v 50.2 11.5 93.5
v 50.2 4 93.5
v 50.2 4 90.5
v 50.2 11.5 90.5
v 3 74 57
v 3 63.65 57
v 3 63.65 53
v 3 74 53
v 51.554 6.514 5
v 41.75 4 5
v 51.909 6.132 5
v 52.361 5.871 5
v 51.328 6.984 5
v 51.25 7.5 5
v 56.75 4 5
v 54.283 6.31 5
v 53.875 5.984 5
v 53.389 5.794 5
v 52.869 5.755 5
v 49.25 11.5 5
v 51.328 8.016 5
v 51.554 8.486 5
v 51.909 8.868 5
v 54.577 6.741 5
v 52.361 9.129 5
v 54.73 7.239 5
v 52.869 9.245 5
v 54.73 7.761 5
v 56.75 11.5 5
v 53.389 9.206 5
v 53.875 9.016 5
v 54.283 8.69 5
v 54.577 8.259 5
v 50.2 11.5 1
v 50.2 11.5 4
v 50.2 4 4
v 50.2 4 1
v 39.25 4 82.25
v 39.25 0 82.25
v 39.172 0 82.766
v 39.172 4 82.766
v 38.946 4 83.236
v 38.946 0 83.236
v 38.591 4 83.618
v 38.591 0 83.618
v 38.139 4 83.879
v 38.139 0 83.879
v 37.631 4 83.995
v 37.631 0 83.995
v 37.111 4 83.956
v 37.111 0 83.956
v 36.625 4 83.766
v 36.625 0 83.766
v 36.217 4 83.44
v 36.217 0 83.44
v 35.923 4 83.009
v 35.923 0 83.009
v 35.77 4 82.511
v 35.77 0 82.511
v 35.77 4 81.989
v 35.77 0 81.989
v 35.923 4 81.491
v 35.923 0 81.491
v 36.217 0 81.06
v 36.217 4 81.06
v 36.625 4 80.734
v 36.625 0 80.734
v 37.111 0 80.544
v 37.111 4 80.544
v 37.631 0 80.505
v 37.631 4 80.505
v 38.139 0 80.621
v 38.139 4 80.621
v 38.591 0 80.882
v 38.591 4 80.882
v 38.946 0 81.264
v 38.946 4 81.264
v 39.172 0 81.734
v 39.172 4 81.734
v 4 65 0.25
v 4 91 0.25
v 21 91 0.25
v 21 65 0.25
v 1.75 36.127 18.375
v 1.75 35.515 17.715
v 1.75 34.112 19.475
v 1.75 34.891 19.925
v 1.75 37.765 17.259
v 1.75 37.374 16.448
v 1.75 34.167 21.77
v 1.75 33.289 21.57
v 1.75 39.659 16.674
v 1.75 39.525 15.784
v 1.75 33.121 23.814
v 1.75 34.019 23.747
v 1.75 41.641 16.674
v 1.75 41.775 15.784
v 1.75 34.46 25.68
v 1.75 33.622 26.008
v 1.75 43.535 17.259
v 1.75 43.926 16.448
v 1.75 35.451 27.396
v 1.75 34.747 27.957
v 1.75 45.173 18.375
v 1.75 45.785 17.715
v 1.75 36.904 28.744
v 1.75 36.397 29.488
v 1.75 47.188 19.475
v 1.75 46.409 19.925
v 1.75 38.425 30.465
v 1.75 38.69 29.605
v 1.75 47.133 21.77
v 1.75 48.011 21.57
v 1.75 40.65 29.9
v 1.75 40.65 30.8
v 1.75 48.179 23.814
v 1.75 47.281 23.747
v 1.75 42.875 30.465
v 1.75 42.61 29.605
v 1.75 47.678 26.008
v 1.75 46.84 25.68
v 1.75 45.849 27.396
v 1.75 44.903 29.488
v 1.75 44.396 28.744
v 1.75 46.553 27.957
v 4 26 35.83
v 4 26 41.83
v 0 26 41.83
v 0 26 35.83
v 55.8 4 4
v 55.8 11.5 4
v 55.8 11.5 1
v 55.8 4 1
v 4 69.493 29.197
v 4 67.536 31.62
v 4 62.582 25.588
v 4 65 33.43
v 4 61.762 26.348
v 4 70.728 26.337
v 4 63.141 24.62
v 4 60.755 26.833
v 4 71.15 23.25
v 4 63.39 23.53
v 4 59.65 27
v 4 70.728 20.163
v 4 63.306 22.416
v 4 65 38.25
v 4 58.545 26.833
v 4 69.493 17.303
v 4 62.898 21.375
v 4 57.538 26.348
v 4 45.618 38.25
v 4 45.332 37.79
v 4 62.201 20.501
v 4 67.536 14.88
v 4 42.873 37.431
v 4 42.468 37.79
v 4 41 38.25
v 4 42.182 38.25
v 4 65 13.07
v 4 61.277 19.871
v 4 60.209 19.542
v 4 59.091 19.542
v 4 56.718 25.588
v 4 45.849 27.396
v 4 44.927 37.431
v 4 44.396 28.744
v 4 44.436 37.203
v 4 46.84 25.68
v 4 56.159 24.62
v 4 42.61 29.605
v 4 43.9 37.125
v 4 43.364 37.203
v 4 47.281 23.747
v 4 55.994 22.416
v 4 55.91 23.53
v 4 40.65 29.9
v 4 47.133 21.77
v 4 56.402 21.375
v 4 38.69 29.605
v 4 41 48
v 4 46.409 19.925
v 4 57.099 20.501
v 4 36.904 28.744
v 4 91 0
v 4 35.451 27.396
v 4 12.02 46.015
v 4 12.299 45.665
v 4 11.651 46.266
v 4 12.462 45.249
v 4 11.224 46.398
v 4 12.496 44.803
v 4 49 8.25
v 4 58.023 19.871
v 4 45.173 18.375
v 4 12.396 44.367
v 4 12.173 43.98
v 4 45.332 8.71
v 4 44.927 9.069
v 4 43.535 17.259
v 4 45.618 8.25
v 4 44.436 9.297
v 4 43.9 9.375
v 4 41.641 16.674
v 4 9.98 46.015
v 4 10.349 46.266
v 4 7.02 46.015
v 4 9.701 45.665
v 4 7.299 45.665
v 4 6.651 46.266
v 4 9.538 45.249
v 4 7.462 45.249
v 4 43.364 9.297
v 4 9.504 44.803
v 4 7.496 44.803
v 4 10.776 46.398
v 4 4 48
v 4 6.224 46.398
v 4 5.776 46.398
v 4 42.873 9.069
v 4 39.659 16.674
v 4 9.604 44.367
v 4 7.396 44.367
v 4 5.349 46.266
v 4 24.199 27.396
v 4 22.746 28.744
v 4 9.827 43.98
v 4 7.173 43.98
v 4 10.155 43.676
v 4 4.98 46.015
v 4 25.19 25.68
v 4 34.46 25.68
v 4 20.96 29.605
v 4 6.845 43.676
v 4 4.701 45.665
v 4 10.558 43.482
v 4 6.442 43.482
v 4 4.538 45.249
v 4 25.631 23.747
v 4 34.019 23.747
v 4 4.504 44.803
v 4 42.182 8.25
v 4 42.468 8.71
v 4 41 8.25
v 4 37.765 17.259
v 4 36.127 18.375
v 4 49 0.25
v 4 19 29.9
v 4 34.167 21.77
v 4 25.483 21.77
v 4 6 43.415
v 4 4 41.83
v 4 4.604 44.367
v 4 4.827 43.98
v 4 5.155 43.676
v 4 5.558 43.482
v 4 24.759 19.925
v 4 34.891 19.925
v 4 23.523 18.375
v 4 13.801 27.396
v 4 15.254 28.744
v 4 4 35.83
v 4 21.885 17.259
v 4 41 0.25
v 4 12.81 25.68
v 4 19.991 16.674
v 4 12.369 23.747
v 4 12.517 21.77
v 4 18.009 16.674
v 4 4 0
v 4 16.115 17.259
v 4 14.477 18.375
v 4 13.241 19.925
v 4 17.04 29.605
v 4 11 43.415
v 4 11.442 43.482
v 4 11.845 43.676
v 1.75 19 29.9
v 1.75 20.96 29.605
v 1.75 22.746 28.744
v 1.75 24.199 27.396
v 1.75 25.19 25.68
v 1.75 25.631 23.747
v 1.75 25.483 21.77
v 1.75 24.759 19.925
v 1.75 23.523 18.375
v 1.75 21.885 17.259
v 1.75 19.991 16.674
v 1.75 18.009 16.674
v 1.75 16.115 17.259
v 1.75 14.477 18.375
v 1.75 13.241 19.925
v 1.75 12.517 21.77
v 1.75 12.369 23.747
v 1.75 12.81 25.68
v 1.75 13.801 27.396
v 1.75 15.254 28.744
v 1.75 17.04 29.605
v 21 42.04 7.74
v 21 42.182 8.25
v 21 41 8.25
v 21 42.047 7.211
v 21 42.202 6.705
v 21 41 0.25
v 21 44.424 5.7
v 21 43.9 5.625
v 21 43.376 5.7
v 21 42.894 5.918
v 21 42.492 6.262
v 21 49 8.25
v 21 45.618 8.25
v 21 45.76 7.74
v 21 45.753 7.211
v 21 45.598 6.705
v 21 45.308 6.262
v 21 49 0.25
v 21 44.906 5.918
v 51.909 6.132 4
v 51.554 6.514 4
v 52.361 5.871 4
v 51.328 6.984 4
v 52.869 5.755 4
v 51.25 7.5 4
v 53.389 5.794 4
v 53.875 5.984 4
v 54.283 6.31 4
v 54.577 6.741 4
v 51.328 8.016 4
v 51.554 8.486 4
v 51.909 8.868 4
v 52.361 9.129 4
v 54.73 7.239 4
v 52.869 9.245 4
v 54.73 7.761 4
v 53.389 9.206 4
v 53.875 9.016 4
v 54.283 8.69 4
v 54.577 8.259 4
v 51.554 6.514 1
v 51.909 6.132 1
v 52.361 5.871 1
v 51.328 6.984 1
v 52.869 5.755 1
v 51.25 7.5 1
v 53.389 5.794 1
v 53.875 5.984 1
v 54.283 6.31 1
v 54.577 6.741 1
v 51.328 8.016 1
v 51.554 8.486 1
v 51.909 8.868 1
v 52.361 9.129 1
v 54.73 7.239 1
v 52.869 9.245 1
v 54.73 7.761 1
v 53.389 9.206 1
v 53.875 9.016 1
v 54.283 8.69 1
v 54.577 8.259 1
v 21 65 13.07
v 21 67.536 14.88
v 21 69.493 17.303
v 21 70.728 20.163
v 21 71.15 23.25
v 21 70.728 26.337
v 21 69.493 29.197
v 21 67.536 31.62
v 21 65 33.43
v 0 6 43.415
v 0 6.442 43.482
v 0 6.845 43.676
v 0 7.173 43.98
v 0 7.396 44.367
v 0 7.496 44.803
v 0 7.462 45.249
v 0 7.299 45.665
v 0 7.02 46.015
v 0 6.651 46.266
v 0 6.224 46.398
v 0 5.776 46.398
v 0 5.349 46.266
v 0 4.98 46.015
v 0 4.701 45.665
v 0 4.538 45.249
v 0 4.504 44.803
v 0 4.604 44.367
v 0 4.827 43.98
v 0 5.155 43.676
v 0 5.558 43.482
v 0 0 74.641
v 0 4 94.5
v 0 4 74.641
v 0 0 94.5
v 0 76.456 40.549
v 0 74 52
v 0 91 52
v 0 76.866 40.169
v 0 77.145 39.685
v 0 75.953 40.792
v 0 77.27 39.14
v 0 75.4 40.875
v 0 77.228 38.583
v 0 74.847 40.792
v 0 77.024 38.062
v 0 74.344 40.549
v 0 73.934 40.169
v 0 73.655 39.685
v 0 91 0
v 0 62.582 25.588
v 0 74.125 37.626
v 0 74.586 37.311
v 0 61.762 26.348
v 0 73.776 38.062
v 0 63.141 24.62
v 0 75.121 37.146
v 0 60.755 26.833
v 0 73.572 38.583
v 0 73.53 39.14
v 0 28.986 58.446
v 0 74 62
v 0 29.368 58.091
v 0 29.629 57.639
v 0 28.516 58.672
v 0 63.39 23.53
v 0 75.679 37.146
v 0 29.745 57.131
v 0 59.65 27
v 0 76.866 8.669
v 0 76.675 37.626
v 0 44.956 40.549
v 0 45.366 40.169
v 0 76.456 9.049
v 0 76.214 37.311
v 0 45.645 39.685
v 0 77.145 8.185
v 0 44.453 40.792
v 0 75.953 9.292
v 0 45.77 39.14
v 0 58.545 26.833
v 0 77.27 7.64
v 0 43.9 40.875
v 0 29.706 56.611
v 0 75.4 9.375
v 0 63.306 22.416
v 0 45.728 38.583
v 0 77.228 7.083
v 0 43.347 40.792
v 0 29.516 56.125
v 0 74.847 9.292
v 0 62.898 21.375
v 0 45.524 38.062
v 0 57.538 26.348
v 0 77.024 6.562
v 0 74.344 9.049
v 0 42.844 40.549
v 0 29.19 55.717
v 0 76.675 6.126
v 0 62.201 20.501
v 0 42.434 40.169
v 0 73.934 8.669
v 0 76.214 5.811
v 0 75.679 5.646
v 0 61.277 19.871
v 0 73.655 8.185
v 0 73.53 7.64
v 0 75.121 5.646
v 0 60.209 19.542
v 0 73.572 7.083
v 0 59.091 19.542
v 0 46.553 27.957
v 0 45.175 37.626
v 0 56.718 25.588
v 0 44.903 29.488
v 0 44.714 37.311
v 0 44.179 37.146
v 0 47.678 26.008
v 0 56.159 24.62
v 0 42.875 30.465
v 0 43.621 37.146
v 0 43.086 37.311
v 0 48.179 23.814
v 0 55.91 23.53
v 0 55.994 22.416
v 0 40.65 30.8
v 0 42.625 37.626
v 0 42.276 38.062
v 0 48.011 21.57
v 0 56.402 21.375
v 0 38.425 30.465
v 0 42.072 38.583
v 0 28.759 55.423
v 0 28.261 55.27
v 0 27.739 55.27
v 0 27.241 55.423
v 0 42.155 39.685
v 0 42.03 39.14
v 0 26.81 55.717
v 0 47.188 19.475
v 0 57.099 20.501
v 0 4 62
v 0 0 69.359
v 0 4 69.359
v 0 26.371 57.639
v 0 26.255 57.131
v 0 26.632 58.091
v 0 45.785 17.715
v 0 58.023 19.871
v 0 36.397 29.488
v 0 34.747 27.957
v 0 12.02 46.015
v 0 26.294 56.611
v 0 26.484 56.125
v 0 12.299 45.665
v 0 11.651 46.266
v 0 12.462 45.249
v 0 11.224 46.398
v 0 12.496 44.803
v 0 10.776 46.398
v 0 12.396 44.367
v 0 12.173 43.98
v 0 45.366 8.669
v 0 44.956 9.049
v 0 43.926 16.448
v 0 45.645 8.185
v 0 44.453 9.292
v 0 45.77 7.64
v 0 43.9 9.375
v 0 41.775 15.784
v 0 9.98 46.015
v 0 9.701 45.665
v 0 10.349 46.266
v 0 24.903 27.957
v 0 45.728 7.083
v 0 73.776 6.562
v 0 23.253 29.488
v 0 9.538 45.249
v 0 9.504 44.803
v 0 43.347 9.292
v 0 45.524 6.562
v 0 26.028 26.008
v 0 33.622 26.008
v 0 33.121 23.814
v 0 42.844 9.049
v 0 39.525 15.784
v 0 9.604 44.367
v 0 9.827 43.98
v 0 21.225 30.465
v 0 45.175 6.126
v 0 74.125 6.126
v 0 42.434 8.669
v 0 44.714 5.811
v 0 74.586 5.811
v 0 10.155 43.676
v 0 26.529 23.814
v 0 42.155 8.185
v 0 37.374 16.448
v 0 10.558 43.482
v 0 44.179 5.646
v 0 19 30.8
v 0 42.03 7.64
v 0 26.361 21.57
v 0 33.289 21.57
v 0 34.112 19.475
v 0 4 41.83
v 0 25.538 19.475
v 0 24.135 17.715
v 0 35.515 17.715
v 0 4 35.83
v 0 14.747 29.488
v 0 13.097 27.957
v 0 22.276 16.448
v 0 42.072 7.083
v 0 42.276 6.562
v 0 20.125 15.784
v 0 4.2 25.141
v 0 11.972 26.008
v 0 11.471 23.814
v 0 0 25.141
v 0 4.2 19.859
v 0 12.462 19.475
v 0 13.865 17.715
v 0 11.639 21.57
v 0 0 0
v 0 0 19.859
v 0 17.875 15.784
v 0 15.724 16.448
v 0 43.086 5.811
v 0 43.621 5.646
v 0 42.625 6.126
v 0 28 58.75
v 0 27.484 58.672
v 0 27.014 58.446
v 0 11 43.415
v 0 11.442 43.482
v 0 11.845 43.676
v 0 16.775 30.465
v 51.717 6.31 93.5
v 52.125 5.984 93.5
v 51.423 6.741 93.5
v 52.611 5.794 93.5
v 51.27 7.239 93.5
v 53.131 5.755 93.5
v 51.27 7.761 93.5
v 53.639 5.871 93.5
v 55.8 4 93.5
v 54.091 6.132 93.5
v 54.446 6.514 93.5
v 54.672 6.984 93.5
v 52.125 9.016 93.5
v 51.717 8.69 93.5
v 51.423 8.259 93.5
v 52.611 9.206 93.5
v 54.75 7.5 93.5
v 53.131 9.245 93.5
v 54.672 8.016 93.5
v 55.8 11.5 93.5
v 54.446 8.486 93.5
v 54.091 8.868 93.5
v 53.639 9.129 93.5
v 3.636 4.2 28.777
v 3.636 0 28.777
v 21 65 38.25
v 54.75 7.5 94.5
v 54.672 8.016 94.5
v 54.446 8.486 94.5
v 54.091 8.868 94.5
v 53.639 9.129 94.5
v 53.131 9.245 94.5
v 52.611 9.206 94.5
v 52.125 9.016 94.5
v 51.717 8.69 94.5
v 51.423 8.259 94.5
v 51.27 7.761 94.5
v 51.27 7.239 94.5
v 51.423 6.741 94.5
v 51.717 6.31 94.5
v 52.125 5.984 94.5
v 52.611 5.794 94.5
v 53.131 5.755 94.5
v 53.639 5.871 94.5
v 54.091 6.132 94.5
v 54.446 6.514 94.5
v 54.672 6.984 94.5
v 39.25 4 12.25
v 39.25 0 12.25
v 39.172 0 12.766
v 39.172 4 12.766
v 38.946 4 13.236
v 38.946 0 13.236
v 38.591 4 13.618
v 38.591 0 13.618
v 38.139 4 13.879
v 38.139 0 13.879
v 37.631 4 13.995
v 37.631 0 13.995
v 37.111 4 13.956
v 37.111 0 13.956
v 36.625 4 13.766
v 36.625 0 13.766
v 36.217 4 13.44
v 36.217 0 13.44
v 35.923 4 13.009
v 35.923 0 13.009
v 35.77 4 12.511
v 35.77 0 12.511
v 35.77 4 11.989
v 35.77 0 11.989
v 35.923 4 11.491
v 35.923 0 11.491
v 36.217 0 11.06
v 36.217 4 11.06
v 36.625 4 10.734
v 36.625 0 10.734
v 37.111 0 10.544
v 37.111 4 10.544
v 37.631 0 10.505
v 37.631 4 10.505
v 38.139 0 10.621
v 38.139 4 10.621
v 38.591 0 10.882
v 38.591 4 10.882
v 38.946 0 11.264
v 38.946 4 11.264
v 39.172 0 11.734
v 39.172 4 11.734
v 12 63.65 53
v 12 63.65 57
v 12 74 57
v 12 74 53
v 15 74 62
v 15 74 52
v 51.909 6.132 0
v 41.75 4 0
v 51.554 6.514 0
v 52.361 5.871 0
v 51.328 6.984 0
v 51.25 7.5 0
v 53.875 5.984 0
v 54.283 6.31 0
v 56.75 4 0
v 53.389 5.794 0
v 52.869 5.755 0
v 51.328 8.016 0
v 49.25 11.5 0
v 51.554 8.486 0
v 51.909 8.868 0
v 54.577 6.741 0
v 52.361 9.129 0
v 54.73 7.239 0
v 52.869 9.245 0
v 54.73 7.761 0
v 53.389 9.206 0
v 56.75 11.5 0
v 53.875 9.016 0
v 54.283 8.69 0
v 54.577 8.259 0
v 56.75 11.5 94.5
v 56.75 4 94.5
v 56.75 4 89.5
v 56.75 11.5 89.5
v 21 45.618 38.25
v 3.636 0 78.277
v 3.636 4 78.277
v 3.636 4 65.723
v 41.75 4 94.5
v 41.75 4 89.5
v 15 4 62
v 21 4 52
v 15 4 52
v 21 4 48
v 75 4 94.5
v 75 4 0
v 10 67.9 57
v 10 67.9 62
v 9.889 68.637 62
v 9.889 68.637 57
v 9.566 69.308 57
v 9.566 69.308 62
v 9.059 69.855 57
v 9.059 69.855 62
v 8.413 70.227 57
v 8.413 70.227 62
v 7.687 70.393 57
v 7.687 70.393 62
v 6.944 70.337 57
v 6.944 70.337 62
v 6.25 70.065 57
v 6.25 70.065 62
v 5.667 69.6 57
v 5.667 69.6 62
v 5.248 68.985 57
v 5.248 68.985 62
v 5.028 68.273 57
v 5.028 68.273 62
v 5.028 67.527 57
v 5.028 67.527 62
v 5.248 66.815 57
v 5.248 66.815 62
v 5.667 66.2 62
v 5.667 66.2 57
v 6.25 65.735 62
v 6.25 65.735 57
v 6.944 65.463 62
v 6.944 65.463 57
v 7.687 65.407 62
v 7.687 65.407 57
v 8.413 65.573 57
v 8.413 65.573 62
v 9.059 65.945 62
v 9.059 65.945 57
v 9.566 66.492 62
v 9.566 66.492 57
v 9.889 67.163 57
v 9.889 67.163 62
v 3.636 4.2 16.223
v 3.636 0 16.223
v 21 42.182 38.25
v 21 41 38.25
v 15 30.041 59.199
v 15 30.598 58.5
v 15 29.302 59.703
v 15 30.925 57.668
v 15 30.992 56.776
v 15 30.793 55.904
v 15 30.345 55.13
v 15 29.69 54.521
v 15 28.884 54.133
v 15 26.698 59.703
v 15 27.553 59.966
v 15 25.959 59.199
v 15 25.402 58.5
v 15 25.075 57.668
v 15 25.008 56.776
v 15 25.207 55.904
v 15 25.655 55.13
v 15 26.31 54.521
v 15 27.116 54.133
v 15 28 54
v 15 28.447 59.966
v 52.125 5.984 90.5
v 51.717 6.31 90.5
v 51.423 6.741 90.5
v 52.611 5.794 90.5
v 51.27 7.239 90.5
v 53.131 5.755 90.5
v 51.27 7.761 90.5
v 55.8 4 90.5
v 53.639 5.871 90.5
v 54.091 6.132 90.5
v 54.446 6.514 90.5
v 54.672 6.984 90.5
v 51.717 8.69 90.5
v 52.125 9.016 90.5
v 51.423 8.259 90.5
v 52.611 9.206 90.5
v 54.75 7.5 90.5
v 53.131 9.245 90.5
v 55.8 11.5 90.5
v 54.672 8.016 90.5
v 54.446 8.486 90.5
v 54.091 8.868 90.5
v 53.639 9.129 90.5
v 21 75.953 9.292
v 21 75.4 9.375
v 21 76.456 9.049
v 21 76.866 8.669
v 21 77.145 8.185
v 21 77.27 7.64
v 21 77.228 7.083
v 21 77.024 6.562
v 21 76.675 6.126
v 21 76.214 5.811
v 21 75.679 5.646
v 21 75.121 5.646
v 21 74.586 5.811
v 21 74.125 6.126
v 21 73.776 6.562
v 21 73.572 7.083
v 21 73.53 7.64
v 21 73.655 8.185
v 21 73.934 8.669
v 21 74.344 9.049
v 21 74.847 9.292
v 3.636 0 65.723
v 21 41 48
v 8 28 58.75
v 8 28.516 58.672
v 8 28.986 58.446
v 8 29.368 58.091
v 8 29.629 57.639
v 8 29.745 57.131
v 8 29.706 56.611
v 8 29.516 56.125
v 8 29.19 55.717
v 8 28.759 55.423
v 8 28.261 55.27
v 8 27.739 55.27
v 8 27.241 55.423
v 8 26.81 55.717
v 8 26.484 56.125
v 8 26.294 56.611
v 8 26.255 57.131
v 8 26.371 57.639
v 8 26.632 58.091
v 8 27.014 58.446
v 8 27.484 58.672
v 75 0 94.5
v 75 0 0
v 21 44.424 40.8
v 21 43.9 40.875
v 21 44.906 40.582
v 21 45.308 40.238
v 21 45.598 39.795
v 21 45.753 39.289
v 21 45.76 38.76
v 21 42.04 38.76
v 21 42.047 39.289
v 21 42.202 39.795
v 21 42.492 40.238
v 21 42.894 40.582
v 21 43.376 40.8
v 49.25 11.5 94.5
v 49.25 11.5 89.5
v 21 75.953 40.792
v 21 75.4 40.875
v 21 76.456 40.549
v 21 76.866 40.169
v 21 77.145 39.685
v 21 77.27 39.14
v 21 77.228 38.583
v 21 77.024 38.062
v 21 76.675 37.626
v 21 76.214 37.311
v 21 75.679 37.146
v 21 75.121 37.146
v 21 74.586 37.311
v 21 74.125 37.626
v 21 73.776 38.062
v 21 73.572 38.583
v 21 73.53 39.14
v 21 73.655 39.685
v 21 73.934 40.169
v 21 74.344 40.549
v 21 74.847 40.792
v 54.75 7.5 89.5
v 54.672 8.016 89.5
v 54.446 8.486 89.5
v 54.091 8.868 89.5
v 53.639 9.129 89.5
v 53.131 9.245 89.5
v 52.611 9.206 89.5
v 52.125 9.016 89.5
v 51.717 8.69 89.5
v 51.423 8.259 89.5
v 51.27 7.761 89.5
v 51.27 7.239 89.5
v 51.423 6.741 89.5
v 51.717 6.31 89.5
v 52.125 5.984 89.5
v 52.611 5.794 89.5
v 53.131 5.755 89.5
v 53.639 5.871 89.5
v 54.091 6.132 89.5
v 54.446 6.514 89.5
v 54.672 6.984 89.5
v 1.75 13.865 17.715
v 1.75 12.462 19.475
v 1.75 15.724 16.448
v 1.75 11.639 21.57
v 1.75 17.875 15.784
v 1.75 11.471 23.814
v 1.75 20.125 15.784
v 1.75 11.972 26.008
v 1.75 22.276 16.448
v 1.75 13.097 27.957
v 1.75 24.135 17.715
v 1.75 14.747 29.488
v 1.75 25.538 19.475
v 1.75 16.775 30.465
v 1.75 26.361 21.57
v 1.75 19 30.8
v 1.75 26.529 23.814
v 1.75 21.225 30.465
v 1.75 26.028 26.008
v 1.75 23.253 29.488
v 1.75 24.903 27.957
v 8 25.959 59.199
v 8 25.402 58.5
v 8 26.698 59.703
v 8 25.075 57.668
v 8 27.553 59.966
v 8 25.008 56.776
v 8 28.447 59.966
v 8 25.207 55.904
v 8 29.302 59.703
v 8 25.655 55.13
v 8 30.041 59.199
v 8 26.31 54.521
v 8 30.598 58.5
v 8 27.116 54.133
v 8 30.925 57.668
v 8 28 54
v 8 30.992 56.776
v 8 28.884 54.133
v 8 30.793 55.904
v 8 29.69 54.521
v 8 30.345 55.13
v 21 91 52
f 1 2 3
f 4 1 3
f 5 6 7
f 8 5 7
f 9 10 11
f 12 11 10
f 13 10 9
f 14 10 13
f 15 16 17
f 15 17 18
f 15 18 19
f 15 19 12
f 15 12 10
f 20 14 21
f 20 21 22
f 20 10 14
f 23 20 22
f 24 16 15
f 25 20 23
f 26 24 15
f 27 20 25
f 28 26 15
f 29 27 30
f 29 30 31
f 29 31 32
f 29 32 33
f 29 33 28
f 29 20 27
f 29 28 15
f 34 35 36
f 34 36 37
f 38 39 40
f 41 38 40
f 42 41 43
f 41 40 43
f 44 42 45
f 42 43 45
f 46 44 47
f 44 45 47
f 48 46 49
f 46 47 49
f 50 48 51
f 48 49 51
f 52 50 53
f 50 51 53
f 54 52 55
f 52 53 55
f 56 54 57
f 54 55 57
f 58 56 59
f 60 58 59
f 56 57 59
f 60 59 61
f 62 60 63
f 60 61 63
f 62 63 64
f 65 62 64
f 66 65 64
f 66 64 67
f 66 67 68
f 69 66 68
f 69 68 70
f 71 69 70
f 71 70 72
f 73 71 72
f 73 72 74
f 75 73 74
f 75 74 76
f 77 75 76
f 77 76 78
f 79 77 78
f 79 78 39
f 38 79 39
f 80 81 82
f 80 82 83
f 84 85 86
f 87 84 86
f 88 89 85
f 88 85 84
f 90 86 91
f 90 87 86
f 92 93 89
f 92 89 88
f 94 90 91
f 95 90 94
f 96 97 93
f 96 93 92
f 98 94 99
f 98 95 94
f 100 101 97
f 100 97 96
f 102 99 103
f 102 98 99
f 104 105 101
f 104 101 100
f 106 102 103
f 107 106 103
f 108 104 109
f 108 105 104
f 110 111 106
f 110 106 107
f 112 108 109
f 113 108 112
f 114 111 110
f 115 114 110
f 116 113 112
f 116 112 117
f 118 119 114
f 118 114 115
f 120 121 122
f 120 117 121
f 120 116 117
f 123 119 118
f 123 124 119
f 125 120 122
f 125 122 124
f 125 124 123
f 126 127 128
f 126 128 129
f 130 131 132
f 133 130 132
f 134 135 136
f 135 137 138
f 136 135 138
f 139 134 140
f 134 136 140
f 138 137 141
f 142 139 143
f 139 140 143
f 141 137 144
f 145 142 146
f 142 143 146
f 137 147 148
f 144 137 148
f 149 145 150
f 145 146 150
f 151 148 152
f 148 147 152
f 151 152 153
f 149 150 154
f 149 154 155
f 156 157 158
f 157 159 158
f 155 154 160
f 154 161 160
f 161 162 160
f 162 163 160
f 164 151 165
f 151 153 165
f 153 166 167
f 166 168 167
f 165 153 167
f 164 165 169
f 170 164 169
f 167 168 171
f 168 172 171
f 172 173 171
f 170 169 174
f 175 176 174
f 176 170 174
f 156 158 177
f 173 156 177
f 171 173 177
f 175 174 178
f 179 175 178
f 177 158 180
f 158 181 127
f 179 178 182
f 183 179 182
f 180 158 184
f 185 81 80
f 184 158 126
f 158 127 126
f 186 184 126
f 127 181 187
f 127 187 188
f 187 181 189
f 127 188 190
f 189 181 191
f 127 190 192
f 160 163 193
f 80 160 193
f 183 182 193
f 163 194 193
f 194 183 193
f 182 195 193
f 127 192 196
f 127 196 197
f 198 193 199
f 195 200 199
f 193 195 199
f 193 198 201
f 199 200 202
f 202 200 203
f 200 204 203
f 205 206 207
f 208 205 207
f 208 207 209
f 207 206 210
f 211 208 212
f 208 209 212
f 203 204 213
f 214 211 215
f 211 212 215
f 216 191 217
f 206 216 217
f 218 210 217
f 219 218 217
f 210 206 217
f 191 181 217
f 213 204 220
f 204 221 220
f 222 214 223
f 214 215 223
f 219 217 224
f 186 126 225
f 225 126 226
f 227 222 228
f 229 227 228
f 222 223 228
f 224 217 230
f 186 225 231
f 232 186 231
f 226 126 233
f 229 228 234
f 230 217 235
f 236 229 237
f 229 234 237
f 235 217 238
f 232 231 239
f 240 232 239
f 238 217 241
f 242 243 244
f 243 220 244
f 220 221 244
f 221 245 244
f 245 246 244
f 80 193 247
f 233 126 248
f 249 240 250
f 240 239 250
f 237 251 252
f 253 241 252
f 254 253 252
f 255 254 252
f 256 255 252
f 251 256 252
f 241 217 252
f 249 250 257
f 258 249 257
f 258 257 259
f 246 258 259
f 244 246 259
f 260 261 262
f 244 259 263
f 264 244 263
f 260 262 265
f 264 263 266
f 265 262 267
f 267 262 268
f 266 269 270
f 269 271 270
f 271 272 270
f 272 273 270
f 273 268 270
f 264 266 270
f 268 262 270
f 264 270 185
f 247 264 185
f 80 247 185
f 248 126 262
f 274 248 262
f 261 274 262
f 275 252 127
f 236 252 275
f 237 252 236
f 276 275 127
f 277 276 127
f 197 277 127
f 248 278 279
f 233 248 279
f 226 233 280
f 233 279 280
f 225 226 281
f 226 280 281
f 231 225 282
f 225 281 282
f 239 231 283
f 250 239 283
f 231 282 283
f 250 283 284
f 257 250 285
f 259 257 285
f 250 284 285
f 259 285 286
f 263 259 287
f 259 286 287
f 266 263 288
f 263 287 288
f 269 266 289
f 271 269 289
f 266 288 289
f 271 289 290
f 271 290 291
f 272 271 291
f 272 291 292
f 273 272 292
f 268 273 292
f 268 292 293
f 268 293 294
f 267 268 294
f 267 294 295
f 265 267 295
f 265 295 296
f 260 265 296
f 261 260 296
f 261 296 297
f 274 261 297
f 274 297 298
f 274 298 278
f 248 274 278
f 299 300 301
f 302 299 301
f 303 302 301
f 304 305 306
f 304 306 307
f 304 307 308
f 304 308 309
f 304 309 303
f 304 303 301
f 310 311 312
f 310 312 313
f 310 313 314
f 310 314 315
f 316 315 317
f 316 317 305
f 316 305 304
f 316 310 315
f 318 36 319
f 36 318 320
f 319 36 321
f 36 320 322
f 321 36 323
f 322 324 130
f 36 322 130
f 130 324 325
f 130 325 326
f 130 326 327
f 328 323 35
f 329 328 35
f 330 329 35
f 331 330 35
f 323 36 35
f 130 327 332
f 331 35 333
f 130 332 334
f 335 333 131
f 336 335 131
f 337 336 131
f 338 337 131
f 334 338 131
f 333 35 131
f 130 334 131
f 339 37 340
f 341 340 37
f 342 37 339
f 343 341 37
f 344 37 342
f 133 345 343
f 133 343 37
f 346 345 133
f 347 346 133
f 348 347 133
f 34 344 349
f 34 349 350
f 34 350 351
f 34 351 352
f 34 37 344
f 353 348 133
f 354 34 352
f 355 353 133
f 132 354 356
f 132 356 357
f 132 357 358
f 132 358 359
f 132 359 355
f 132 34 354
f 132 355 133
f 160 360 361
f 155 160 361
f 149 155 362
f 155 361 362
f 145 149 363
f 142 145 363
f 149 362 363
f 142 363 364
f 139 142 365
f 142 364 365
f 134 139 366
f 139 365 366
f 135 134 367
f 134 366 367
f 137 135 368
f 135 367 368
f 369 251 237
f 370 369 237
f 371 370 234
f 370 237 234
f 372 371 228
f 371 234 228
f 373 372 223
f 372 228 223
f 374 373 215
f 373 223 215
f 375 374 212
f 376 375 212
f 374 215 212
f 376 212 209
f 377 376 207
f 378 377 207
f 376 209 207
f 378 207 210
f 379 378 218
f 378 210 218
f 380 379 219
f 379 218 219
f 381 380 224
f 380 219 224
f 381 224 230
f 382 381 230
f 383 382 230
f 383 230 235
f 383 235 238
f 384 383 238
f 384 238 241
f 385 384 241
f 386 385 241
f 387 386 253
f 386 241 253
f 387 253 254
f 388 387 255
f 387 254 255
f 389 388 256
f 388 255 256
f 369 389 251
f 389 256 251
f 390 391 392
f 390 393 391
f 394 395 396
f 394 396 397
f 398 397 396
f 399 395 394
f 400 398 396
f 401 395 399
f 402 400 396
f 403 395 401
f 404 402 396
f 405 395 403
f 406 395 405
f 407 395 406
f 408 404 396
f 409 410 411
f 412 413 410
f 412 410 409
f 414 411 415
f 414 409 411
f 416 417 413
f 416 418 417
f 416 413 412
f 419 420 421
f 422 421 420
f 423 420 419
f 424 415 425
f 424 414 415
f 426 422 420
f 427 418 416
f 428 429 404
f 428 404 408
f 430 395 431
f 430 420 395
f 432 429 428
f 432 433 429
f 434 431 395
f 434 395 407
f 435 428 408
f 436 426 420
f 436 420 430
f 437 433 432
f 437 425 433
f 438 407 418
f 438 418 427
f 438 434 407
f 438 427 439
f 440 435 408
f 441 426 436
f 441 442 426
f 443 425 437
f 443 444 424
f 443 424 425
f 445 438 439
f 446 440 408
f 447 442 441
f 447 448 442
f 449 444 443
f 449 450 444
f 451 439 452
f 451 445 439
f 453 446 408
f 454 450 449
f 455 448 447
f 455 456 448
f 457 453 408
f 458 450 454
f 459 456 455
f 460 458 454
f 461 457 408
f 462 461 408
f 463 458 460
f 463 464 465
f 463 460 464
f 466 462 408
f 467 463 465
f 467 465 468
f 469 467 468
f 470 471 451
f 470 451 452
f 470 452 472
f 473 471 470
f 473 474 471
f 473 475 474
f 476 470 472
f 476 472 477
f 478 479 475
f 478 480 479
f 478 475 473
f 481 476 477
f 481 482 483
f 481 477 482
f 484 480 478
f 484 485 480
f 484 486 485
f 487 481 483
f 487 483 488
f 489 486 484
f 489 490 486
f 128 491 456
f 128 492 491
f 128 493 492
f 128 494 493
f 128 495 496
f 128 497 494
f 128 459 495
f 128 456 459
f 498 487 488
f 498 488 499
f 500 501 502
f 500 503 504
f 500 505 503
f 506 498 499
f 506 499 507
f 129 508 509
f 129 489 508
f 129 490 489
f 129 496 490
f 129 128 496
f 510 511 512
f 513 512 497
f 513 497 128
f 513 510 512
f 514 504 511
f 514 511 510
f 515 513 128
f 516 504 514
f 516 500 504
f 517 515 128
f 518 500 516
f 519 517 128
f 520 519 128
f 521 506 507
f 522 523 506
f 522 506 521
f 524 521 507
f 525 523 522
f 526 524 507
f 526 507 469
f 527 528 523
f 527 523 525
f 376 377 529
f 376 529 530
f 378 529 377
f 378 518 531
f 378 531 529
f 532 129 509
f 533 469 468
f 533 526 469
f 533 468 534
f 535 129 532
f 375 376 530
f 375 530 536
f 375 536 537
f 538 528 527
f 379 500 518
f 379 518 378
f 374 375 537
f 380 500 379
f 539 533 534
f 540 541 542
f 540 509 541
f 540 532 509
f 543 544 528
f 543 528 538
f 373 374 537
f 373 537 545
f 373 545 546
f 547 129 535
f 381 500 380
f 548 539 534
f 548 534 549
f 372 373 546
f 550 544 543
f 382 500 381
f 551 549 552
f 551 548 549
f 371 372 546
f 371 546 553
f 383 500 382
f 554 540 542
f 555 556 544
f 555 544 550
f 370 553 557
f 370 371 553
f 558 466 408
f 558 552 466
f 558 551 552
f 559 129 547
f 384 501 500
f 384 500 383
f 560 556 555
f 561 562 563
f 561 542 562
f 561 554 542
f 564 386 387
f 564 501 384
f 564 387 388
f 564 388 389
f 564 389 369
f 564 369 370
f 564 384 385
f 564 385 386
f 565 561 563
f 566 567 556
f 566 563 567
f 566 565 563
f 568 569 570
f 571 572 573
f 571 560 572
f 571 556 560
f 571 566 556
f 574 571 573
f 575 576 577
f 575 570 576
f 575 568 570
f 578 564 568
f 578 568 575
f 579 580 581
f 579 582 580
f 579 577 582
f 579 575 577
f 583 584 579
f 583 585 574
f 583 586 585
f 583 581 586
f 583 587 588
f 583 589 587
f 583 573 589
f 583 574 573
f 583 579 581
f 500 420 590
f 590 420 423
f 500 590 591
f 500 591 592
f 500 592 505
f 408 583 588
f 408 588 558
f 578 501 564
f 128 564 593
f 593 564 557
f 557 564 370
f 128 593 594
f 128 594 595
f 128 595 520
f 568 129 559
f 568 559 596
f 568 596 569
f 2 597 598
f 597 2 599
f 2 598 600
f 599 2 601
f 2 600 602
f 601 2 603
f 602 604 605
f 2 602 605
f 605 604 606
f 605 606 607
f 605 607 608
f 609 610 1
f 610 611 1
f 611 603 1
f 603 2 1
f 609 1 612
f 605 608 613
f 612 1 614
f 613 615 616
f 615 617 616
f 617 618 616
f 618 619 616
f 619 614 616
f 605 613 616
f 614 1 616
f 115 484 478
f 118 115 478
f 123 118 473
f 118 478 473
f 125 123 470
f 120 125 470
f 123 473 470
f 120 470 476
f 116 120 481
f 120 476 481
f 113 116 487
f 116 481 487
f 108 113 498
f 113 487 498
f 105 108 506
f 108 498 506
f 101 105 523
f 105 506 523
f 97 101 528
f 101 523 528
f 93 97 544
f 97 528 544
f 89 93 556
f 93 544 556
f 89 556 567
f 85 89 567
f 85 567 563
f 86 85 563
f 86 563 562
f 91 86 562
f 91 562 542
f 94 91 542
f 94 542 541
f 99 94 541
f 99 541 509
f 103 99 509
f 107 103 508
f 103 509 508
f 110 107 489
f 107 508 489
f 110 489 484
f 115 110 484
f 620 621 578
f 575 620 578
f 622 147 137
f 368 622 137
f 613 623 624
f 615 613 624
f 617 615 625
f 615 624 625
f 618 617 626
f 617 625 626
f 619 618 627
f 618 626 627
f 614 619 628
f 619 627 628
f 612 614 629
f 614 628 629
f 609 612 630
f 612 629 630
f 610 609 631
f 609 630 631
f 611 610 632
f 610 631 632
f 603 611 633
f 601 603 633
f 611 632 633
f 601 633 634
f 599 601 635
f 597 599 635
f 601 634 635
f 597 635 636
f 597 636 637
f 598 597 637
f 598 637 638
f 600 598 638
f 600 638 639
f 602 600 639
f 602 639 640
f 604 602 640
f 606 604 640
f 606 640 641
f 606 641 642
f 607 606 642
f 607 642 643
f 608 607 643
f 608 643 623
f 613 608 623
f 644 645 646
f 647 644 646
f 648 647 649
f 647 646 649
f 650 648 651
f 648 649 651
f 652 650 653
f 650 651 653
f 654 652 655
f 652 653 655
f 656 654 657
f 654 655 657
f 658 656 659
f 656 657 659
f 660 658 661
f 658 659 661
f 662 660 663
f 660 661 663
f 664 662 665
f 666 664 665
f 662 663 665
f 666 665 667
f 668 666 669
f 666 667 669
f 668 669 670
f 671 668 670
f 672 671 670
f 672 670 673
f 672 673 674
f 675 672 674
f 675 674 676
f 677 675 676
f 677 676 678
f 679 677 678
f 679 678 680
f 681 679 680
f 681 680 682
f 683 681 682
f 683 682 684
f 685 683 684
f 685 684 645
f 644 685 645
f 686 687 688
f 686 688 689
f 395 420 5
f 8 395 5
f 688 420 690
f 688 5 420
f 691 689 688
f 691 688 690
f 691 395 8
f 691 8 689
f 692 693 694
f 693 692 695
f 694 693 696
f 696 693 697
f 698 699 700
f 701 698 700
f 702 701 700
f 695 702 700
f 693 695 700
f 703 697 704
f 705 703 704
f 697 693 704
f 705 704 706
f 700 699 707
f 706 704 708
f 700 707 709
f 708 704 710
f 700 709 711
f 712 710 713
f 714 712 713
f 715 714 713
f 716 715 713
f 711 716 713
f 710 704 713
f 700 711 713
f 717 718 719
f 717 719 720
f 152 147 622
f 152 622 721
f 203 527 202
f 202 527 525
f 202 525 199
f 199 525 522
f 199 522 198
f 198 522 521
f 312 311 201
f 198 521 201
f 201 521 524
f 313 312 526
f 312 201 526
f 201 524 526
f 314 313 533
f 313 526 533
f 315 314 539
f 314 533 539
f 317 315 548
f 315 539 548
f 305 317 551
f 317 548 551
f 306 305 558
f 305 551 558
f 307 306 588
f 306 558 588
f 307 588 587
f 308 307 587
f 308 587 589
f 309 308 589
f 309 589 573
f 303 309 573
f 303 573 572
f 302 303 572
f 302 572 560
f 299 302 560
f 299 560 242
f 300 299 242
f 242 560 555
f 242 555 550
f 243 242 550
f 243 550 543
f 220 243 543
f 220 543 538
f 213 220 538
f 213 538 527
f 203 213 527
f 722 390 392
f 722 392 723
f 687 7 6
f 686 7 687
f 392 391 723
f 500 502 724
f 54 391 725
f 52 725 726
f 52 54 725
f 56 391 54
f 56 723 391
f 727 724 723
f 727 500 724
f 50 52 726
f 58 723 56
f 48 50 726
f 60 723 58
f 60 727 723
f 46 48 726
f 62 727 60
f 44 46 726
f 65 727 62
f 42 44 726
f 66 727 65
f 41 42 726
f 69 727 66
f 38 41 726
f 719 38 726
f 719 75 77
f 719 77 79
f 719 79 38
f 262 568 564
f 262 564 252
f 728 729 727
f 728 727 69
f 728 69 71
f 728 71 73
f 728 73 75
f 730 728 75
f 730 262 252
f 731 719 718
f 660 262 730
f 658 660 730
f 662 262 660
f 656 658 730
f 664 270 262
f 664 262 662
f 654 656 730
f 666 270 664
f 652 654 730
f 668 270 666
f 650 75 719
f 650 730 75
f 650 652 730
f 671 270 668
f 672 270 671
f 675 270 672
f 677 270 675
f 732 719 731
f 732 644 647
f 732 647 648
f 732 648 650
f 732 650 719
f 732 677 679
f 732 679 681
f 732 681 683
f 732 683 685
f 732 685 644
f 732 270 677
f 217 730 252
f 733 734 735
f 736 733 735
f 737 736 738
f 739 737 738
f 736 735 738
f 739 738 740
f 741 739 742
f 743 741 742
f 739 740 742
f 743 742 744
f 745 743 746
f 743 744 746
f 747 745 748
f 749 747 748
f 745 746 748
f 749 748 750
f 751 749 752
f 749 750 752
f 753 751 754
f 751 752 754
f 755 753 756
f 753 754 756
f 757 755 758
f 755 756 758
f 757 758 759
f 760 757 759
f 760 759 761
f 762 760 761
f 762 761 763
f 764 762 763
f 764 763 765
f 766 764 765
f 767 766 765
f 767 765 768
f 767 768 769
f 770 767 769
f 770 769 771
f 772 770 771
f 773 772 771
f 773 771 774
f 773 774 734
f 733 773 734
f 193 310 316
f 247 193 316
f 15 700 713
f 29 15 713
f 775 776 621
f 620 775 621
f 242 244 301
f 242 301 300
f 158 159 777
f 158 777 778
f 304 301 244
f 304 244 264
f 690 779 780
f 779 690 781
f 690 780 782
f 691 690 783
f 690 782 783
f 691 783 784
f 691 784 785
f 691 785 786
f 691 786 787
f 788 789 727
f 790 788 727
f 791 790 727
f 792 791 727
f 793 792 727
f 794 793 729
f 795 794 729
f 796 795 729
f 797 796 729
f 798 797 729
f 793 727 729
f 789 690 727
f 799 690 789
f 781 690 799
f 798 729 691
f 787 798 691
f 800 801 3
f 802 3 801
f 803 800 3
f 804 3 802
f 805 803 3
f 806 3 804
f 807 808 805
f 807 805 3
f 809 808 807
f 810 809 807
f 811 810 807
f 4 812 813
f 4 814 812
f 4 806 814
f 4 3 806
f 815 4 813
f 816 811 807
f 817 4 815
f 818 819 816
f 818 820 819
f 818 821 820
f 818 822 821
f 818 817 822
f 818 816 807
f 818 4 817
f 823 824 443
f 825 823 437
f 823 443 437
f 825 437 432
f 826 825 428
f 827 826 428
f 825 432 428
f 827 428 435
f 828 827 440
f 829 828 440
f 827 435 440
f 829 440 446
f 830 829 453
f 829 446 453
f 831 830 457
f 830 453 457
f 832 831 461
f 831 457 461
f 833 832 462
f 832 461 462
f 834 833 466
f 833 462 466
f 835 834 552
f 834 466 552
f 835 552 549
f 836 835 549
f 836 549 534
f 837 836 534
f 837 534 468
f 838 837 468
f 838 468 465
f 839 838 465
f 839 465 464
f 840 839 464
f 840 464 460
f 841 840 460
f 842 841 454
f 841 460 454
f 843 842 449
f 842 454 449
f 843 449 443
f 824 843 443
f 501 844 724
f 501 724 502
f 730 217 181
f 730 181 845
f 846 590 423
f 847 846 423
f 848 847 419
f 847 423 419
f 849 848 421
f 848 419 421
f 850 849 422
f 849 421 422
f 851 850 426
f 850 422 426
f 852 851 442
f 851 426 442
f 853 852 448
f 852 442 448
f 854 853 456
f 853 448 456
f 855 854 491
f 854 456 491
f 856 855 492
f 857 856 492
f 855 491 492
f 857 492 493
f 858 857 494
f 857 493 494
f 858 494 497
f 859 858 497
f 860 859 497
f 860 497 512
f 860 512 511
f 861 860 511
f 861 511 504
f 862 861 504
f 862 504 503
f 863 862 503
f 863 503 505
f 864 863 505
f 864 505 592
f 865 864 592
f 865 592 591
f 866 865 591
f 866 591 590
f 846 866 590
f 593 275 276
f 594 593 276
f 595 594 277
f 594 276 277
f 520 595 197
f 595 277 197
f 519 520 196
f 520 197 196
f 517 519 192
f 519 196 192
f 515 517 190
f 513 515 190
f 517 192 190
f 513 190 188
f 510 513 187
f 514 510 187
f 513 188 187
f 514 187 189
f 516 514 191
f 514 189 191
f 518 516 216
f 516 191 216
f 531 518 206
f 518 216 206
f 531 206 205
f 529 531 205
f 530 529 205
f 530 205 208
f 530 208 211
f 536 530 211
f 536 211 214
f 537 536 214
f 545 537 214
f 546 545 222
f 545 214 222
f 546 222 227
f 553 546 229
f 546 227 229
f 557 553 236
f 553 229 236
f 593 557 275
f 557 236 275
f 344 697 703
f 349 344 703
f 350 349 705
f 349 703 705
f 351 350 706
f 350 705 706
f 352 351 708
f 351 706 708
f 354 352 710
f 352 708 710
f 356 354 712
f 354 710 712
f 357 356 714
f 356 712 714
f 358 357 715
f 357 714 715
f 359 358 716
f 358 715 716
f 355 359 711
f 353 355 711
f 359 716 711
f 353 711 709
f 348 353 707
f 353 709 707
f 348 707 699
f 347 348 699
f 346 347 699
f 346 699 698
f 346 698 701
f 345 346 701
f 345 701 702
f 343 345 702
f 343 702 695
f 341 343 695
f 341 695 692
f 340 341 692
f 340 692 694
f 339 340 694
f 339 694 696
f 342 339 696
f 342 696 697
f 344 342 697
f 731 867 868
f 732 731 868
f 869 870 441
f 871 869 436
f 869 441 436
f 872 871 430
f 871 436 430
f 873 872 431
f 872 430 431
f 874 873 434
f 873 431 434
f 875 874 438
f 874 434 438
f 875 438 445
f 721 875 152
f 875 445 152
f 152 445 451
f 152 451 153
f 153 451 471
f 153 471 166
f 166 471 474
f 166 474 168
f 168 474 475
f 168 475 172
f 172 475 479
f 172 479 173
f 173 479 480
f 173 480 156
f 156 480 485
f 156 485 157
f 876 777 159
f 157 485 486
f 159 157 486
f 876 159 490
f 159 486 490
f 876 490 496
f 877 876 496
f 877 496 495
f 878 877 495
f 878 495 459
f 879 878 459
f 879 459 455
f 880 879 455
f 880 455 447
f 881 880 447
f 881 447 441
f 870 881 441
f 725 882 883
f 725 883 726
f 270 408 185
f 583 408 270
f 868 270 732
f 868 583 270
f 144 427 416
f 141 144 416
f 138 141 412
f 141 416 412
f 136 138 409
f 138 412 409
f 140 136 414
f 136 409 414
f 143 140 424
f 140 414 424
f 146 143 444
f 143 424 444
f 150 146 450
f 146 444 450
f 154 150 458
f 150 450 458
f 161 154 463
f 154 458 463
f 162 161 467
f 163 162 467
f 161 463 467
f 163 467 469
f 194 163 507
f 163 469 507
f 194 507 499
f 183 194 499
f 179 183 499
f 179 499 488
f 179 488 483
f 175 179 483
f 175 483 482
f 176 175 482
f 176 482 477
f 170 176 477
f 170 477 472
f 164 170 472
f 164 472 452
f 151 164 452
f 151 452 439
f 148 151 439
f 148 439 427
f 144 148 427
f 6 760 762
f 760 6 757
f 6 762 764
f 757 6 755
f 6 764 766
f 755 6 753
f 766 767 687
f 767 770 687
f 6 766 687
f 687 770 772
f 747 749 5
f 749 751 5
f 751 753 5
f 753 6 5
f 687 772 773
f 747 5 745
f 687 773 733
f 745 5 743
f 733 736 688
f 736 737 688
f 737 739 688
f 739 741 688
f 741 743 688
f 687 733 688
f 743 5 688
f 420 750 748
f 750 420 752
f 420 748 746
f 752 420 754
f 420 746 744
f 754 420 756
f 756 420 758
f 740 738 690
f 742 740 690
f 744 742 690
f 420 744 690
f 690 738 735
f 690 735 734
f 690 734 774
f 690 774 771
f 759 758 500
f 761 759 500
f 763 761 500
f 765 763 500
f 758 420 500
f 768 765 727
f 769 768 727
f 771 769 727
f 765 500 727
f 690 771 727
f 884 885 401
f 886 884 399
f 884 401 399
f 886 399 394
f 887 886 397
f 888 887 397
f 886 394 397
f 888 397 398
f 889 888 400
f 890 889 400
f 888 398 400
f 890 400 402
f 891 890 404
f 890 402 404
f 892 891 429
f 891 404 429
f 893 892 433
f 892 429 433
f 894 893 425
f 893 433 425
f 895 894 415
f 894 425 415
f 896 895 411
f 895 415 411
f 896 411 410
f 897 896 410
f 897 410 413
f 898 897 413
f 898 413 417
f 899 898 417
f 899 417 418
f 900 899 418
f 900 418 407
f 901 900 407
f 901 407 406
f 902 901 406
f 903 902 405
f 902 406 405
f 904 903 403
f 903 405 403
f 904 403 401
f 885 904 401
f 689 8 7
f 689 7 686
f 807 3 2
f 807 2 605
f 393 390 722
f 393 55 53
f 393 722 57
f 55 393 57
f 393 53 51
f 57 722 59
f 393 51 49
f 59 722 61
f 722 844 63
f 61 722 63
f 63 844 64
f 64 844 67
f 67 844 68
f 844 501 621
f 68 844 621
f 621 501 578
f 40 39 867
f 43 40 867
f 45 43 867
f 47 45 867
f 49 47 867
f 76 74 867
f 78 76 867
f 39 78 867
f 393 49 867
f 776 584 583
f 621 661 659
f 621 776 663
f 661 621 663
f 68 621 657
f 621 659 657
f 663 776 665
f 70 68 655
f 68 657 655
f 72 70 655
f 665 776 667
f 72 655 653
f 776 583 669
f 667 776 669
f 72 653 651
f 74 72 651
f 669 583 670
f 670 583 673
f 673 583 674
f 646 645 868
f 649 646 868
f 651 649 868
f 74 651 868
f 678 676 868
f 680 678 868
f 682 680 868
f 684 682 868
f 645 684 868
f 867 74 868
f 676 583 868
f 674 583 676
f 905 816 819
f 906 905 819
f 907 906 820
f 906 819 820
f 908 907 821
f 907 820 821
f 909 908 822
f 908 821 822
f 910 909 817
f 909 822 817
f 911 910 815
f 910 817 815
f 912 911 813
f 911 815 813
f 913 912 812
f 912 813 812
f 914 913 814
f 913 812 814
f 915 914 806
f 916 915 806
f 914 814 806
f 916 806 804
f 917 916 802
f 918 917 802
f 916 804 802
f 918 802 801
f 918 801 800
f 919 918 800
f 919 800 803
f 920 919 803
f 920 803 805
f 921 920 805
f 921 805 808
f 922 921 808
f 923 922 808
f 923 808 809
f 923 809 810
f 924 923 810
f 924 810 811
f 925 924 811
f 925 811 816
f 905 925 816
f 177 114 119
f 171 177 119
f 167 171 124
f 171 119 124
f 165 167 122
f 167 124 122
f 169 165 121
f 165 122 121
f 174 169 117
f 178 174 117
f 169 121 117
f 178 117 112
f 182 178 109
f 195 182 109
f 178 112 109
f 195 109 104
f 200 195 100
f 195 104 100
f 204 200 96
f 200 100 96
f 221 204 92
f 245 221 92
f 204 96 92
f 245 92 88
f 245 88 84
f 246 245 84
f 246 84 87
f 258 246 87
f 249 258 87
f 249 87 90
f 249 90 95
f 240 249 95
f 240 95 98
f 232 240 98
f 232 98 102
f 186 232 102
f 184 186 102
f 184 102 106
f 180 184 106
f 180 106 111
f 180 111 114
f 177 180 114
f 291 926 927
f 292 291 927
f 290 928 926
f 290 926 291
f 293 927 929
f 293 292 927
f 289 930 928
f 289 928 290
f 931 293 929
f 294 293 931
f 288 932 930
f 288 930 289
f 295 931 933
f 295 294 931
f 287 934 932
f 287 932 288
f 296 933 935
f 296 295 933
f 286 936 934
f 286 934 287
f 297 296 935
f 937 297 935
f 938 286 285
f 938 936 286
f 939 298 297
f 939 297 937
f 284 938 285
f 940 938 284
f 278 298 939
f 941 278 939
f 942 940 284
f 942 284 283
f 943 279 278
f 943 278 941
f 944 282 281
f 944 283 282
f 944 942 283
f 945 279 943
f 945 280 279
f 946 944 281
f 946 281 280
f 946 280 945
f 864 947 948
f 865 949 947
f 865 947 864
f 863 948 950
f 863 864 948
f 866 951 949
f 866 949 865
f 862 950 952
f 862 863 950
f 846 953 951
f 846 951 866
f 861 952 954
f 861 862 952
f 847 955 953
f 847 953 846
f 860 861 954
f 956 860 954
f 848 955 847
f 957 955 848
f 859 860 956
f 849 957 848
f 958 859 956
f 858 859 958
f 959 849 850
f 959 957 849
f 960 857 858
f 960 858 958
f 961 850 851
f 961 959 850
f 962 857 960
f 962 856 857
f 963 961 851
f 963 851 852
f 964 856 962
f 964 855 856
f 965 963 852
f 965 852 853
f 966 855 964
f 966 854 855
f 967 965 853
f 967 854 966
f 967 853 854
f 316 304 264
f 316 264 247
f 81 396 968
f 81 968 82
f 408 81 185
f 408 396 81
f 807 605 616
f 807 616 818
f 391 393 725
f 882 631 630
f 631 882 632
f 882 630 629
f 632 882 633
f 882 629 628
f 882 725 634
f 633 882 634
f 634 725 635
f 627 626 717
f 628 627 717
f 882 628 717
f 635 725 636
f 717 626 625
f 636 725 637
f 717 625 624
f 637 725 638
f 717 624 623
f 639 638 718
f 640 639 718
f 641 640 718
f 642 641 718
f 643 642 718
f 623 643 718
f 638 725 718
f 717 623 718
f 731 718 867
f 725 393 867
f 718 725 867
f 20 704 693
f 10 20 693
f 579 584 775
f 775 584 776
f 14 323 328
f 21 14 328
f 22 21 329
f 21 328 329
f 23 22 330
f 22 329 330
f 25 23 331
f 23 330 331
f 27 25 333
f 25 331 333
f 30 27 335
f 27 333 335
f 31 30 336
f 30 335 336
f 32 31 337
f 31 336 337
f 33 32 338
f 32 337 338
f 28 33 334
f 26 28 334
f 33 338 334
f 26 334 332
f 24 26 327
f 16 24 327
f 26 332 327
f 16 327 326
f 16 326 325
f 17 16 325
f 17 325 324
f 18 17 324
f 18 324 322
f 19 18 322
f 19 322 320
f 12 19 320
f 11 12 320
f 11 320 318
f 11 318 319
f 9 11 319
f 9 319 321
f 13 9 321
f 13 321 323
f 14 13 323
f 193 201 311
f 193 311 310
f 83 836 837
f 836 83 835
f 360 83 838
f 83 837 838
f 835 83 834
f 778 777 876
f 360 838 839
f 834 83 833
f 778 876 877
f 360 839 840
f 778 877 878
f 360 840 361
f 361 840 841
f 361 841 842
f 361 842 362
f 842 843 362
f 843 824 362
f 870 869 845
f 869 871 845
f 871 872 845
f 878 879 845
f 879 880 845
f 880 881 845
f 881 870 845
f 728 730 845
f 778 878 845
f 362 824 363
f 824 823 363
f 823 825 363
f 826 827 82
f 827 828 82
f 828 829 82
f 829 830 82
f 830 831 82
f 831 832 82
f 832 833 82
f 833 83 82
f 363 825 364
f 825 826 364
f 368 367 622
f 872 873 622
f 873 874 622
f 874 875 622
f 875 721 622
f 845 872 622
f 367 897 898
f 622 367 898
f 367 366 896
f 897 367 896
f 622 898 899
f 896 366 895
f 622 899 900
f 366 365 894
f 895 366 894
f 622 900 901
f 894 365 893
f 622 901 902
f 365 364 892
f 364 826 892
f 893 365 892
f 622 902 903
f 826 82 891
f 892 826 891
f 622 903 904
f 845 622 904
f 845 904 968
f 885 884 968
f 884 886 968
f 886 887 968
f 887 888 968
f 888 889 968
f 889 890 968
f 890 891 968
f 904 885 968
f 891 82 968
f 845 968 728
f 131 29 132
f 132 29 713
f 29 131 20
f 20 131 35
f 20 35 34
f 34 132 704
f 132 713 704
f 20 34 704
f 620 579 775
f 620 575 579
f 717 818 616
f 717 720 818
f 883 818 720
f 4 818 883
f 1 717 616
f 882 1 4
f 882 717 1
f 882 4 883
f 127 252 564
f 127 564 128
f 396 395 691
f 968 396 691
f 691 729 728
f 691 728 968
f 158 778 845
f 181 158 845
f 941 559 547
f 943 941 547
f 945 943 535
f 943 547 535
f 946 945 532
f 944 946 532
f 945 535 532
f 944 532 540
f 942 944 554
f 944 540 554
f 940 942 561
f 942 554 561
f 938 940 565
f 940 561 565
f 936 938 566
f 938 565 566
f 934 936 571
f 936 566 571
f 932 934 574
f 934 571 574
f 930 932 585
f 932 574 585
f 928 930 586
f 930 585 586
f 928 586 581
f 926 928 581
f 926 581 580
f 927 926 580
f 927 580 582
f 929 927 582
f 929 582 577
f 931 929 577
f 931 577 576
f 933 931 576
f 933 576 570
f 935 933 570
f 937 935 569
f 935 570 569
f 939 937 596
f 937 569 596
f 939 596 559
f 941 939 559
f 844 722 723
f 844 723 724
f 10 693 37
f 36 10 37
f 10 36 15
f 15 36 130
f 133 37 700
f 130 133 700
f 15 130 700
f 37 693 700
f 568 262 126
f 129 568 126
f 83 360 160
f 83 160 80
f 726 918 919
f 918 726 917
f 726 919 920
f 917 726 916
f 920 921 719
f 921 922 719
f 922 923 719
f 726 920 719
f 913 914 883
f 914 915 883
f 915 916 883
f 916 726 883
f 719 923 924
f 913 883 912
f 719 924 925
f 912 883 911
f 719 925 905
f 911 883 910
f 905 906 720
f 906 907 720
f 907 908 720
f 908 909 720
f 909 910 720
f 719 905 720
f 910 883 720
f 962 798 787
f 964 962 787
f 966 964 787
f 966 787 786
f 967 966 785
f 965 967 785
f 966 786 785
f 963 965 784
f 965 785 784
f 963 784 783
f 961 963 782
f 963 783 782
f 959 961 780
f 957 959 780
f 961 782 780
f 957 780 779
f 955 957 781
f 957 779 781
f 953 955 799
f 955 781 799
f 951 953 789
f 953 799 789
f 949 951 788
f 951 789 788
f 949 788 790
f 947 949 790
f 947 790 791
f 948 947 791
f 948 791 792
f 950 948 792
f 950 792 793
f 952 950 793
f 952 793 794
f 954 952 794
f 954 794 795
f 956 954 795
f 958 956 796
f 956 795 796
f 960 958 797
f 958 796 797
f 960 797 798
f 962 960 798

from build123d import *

# Parameters (mm, degrees)
SKETCH20_W                        = 75
SKETCH20_H                        = 94.5
BASE_DEPTH                        = 4
SKETCH21_W                        = 21
SKETCH21_H                        = 4
X_WALL_DEPTH                      = 87
SKETCH22_W                        = 4
SKETCH22_H                        = 48
Y_WALL_DEPTH                      = 87
SKETCH23_W                        = 15
SKETCH23_H                        = 10
BELT_SCREW_MOUNT_DEPTH            = 70
SKETCH24_W                        = 8
SKETCH24_H                        = 8
MOTOR_SPACER_DEPTH                = 17
SKETCH14_R                        = 6.65
SKETCH14_R_2                      = 3.75
SKETCH14_R_3                      = 1.875
MOTOR_BEARING_HOLES_DEPTH         = 21
SKETCH15_R                        = 7.55
BEARING_HOLES_2_DEPTH             = 1.75
SKETCH17_R                        = 2.5
BELT_SCREW_HOLE_DEPTH             = 8
SKETCH18_W                        = 9
SKETCH18_H                        = 4
BELT_BOLT_HOLE_DEPTH              = 10.35
SKETCH25_R                        = 11.5
MOTOR_CUTOUT_DEPTH                = 17
SKETCH26_R                        = 1.75
CONNECTOR_SCREW_HOLE_DEPTH        = 15
SKETCH42_R                        = 3
CUT_EXTRUDE2_DEPTH                = 7
DOVETAILCUTOUT_DEPTH              = 4.2
FRONT_RIGHT_CASE_SCREW_BODY_DEPTH = 5
SKETCH29_R                        = 1.75
FRONT_RIGHT_CASE_SCREW_HOLE_DEPTH = 10
SKETCH30_W                        = 5.6
SKETCH30_H                        = 3
FRONT_RIGHT_CASE_NUT_HOLE_DEPTH   = 7.5
BACK_RIGHT_CASE_SCREW_BODY_DEPTH  = 5
SKETCH38_R                        = 1.75
BACK_RIGHT_CASE_SCREW_HOLE_DEPTH  = 5
SKETCH39_W                        = 5.6
SKETCH39_H                        = 3
BACK_RIGHT_CASE_NUT_HOLE_DEPTH    = 7.5
SKETCH40_R                        = 1.75
FOOT_HOLES_DEPTH                  = 10
SKETCH41_R                        = 1.5
SKETCH41_W                        = 6
SKETCH41_H                        = 22
MOTOR_CABLE_PASSTHROUGH_DEPTH     = 4


with BuildPart() as part:
    # Sketch20 → Base (new body)
    with BuildSketch(Plane(origin=(0, 0, 0), x_dir=(1, 0, 0), z_dir=(0, 1, 0))):
        with Locations((37.5, -47.25)):
            Rectangle(SKETCH20_W, SKETCH20_H)
    extrude(amount=BASE_DEPTH)

    # Sketch21 → X_Wall (add)
    with BuildSketch(Plane(origin=(0, 4, 0), x_dir=(1, 0, 0), z_dir=(0, 1, 0))):
        with Locations((10.5, -50)):
            Rectangle(SKETCH21_W, SKETCH21_H)
    extrude(amount=X_WALL_DEPTH)

    # Sketch22 → Y_Wall (add)
    with BuildSketch(Plane(origin=(0, 4, 0), x_dir=(1, 0, 0), z_dir=(0, 1, 0))):
        with Locations((2, -24)):
            Rectangle(SKETCH22_W, SKETCH22_H)
    extrude(amount=Y_WALL_DEPTH)

    # Sketch23 → Belt_Screw_Mount (add)
    with BuildSketch(Plane(origin=(0, 4, 0), x_dir=(1, 0, 0), z_dir=(0, 1, 0))):
        with Locations((7.5, -57)):
            Rectangle(SKETCH23_W, SKETCH23_H)
    extrude(amount=BELT_SCREW_MOUNT_DEPTH)

    # Sketch24 → Motor_Spacer (add)
    with BuildSketch(Plane(origin=(4, 0, 0), x_dir=(0, 0, -1), z_dir=(1, 0, 0))):
        Polygon((-48, 41), (-48, 91), (-0.25, 91), (-0.25, 65), (-8.25, 65), (-38.25, 65), (-38.25, 41), align=None)
        with Locations((-4.25, 45)):
            Rectangle(SKETCH24_W, SKETCH24_H)
    extrude(amount=MOTOR_SPACER_DEPTH)

    # Sketch14 → Motor_Bearing_Holes (cut)
    with BuildSketch(Plane.ZY):
        with Locations((23.25, 19)):
            Circle(SKETCH14_R)
        with Locations((23.25, 40.65)):
            Circle(SKETCH14_R)
        with Locations((23.25, 59.65)):
            Circle(SKETCH14_R_2)
        with Locations((39, 75.4)):
            Circle(SKETCH14_R_3)
        with Locations((39, 43.9)):
            Circle(SKETCH14_R_3)
        with Locations((7.5, 43.9)):
            Circle(SKETCH14_R_3)
        with Locations((7.5, 75.4)):
            Circle(SKETCH14_R_3)
    extrude(amount=-MOTOR_BEARING_HOLES_DEPTH, mode=Mode.SUBTRACT)

    # Sketch15 → Bearing_Holes_2 (cut)
    with BuildSketch(Plane.ZY):
        with Locations((23.25, 19)):
            Circle(SKETCH15_R)
        with Locations((23.25, 40.65)):
            Circle(SKETCH15_R)
    extrude(amount=-BEARING_HOLES_2_DEPTH, mode=Mode.SUBTRACT)

    # Sketch17 → Belt_Screw_Hole (cut)
    with BuildSketch(Plane.XY.offset(62)):
        with Locations((7.5, 67.9)):
            Circle(SKETCH17_R)
    extrude(amount=-BELT_SCREW_HOLE_DEPTH, mode=Mode.SUBTRACT)

    # Sketch18 → Belt_Bolt_Hole (cut)
    with BuildSketch(Plane(origin=(0, 74, 0), x_dir=(1, 0, 0), z_dir=(0, 1, 0))):
        with Locations((7.5, -55)):
            Rectangle(SKETCH18_W, SKETCH18_H)
    extrude(amount=-BELT_BOLT_HOLE_DEPTH, mode=Mode.SUBTRACT)

    # Sketch25 → Motor_Cutout (cut)
    with BuildSketch(Plane(origin=(21, 0, 0), x_dir=(0, 0, -1), z_dir=(1, 0, 0))):
        with Locations((-23.25, 59.65)):
            Circle(SKETCH25_R)
    extrude(amount=-MOTOR_CUTOUT_DEPTH, mode=Mode.SUBTRACT)

    # Sketch26 → Connector_Screw-hole (cut)
    with BuildSketch(Plane.ZY):
        with Locations((57, 28)):
            Circle(SKETCH26_R)
    extrude(amount=-CONNECTOR_SCREW_HOLE_DEPTH, mode=Mode.SUBTRACT)

    # Sketch42 → Cut-Extrude2 (cut)
    with BuildSketch(Plane(origin=(15, 0, 0), x_dir=(0, 0, -1), z_dir=(1, 0, 0))):
        with Locations((-57, 28)):
            Circle(SKETCH42_R)
    extrude(amount=-CUT_EXTRUDE2_DEPTH, mode=Mode.SUBTRACT)

    # Sketch27 → DoveTailCutout (cut)
    with BuildSketch(Plane.XZ):
        Polygon((3.635533906, 65.723044738), (-0.1, 69.458578644), (-0.1, 74.541421356), (3.635533906, 78.276955262), align=None)
        Polygon((3.635533906, 16.223044738), (3.635533906, 28.776955262), (-0.1, 25.041421356), (-0.1, 19.958578644), align=None)
    extrude(amount=-DOVETAILCUTOUT_DEPTH, mode=Mode.SUBTRACT)

    # Sketch28 → Front_Right_Case_Screw_Body (add)
    with BuildSketch(Plane.XY.offset(94.5)):
        Polygon((56.75, 4), (56.75, 11.5), (49.25, 11.5), (41.75, 4), align=None)
    extrude(amount=-FRONT_RIGHT_CASE_SCREW_BODY_DEPTH)

    # Sketch29 → Front_Right_Case_Screw_Hole (cut)
    with BuildSketch(Plane.XY.offset(94.5)):
        with Locations((53, 7.5)):
            Circle(SKETCH29_R)
    extrude(amount=-FRONT_RIGHT_CASE_SCREW_HOLE_DEPTH, mode=Mode.SUBTRACT)

    # Sketch30 → Front_Right_Case_Nut_Hole (cut)
    with BuildSketch(Plane(origin=(0, 11.5, 0), x_dir=(1, 0, 0), z_dir=(0, 1, 0))):
        with Locations((53, -92)):
            Rectangle(SKETCH30_W, SKETCH30_H)
    extrude(amount=-FRONT_RIGHT_CASE_NUT_HOLE_DEPTH, mode=Mode.SUBTRACT)

    # Sketch40 → Foot_Holes (cut)
    with BuildSketch(Plane.XZ):
        with Locations((37.5, 82.25)):
            Circle(SKETCH40_R)
        with Locations((37.5, 12.25)):
            Circle(SKETCH40_R)
    extrude(amount=-FOOT_HOLES_DEPTH, mode=Mode.SUBTRACT)

    # Sketch41 → Motor_Cable_Passthrough (cut)
    with BuildSketch(Plane(origin=(4, 0, 0), x_dir=(0, 0, -1), z_dir=(1, 0, 0))):
        with Locations((-44.915, 11)):
            Circle(SKETCH41_R)
        with Locations((-44.915, 6)):
            Circle(SKETCH41_R)
        with Locations((-38.83, 15)):
            Rectangle(SKETCH41_W, SKETCH41_H)
    extrude(amount=-MOTOR_CABLE_PASSTHROUGH_DEPTH, mode=Mode.SUBTRACT)


with BuildPart() as body_2:
    # Sketch37 → Back_Right_Case_Screw_Body (new body)
    with BuildSketch(Plane(origin=(0, 0, 0), x_dir=(-1, 0, 0), z_dir=(0, 0, -1))):
        Polygon((-56.75, 4), (-56.75, 11.5), (-49.25, 11.5), (-41.75, 4), align=None)
    extrude(amount=-BACK_RIGHT_CASE_SCREW_BODY_DEPTH)

    # Sketch38 → Back_Right_Case_Screw_Hole (cut)
    with BuildSketch(Plane(origin=(0, 0, 0), x_dir=(-1, 0, 0), z_dir=(0, 0, -1))):
        with Locations((-53, 7.5)):
            Circle(SKETCH38_R)
    extrude(amount=-BACK_RIGHT_CASE_SCREW_HOLE_DEPTH, mode=Mode.SUBTRACT)

    # Sketch39 → Back_Right_Case_Nut_Hole (cut)
    with BuildSketch(Plane(origin=(0, 11.5, 0), x_dir=(1, 0, 0), z_dir=(0, 1, 0))):
        with Locations((53, -2.5)):
            Rectangle(SKETCH39_W, SKETCH39_H)
    extrude(amount=-BACK_RIGHT_CASE_NUT_HOLE_DEPTH, mode=Mode.SUBTRACT)


solid = Compound([part.part, body_2.part])
